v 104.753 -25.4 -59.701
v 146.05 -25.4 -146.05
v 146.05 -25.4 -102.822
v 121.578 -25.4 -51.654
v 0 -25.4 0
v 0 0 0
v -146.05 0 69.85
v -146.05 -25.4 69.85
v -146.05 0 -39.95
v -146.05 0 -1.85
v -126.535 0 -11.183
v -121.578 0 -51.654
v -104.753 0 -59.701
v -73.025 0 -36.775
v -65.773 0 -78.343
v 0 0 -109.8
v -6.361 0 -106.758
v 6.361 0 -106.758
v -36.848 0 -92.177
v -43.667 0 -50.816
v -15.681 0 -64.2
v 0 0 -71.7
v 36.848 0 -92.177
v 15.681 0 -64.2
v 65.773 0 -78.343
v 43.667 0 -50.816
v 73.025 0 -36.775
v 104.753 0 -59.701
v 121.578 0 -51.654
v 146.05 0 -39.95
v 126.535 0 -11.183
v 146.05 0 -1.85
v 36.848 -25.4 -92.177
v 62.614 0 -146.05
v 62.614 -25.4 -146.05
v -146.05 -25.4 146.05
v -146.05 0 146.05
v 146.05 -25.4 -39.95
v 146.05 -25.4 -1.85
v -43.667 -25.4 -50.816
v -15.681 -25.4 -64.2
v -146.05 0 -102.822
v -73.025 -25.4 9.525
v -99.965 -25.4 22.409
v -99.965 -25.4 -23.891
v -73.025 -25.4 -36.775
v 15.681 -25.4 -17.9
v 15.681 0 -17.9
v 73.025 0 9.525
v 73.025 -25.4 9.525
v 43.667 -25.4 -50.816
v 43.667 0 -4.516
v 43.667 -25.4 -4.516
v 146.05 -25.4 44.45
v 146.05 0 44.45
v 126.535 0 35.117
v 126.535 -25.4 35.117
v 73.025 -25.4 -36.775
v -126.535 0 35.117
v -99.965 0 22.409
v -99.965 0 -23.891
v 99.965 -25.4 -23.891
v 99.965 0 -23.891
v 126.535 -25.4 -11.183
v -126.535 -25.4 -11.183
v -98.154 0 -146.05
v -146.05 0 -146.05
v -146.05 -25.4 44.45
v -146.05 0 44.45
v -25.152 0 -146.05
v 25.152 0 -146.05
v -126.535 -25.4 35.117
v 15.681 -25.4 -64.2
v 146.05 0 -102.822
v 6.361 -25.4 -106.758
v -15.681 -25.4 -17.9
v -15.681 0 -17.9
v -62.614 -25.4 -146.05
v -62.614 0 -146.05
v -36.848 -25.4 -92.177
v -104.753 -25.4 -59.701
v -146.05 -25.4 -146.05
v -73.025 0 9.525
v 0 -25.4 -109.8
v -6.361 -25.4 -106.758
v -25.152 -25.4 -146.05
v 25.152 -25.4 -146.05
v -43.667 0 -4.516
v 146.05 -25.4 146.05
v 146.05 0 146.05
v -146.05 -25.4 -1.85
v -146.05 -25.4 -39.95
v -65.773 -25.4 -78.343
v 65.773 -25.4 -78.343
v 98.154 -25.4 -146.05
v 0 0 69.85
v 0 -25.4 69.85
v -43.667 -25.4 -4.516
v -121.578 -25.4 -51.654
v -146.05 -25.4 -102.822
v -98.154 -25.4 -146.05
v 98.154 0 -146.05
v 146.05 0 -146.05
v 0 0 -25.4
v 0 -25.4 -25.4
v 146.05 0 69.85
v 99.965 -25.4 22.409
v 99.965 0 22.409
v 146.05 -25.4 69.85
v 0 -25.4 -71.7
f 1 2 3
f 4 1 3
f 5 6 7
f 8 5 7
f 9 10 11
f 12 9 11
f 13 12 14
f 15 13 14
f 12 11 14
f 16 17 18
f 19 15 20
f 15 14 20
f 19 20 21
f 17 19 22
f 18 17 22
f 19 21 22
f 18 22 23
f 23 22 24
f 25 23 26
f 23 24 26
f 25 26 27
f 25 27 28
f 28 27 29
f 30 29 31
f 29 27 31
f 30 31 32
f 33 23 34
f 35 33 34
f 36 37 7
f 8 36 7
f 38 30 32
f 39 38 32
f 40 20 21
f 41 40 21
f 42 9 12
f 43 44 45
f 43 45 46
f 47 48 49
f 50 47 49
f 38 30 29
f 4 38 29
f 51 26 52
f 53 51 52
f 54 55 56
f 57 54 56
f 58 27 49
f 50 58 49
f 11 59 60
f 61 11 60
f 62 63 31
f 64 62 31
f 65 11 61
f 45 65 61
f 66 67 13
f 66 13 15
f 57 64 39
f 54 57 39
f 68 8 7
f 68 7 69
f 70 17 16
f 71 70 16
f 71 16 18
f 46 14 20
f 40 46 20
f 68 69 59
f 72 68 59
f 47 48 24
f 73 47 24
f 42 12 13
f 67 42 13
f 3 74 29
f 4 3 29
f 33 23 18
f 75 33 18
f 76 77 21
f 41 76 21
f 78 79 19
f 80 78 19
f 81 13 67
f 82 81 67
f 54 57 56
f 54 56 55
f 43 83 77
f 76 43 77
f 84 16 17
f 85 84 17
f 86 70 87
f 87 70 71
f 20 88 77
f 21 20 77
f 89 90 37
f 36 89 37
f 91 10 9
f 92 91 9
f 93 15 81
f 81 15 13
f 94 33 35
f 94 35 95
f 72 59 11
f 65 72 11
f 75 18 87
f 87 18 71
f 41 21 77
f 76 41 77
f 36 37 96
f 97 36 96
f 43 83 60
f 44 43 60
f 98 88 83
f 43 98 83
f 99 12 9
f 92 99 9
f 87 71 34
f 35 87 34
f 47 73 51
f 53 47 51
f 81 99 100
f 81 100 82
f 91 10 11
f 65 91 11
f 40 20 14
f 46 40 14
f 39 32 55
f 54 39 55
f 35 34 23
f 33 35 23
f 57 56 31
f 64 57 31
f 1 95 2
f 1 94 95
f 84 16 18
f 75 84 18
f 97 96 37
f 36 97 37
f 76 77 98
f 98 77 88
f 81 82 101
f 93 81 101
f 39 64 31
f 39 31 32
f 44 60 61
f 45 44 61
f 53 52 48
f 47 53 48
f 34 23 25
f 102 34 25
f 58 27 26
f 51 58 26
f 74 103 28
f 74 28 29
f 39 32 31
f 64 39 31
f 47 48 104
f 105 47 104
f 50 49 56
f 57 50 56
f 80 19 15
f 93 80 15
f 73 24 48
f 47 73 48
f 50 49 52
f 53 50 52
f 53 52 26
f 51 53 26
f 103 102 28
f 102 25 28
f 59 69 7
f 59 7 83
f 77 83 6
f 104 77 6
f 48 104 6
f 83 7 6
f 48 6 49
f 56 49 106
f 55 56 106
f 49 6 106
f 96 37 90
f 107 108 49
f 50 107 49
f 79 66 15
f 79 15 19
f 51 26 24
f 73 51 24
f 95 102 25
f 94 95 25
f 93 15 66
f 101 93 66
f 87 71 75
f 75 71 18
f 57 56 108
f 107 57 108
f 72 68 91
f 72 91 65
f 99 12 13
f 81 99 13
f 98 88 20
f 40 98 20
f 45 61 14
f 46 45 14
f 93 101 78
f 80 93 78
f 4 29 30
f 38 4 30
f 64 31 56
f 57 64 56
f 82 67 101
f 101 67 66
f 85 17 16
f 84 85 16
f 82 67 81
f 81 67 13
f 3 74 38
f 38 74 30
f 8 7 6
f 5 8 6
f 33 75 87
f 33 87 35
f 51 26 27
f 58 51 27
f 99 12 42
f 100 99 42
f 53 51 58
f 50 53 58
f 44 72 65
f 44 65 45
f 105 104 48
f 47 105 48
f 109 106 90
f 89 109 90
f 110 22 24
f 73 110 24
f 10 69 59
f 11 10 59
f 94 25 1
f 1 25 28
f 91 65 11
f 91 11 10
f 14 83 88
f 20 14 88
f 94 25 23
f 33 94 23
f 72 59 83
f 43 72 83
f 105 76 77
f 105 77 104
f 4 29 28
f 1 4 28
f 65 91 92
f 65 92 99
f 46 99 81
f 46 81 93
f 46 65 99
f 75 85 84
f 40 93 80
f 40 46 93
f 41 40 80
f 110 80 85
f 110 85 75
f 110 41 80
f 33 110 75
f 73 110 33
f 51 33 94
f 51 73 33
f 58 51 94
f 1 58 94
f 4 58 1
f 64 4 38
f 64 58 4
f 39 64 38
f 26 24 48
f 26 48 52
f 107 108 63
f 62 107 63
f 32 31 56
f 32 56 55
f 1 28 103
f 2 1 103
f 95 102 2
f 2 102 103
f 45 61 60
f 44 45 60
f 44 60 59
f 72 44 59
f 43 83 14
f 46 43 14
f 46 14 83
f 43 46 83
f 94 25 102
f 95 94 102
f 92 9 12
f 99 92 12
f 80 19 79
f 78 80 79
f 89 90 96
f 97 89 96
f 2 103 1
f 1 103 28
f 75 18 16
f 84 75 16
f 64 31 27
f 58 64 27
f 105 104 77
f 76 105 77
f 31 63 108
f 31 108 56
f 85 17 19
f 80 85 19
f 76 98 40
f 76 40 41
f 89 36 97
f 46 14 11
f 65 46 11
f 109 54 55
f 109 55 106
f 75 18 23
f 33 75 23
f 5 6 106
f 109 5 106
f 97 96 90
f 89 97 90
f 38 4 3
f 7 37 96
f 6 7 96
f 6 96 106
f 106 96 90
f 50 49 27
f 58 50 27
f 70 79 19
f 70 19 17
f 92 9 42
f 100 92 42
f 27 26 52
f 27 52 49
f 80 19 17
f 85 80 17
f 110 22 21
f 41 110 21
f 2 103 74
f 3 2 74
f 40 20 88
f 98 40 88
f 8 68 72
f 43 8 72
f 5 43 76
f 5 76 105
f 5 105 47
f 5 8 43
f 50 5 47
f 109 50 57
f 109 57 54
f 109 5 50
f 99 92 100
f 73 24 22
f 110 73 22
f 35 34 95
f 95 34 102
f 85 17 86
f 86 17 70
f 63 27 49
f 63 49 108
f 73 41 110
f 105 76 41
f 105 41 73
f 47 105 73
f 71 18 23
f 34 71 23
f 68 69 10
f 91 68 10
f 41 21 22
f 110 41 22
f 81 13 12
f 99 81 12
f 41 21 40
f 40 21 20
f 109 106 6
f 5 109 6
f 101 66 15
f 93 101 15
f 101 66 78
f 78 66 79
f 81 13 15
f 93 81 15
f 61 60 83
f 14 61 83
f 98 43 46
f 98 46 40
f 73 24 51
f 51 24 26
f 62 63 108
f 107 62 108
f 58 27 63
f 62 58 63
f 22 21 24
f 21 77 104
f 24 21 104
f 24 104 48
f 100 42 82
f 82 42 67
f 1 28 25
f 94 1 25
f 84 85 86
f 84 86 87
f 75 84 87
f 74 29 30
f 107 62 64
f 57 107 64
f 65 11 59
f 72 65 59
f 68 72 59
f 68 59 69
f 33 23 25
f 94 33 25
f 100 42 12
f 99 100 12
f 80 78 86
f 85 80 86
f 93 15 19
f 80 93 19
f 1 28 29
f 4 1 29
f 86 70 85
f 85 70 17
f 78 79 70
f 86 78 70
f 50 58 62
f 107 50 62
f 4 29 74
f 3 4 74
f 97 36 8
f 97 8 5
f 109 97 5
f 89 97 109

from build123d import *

# Parameters (mm, degrees)
F1_DEPTH  = 25.4
F2_DEPTH  = 25.4
F3_DEPTH  = 25.4
F4_DEPTH  = 25.4
F5_DEPTH  = 25.4
F6_DEPTH  = 25.4
F7_DEPTH  = 25.4
F8_DEPTH  = 25.4
F9_DEPTH  = 25.4
F10_DEPTH = 25.4
F11_DEPTH = 25.4
F12_DEPTH = 25.4
F13_DEPTH = 25.4
F14_DEPTH = 25.4
F15_DEPTH = 25.4
F16_DEPTH = 25.4
F17_DEPTH = 25.4
F18_DEPTH = 25.4
F19_DEPTH = 25.4
F20_DEPTH = 25.4


with BuildPart() as f1:
    # F0 (on Front) → F1 (new body)
    with BuildSketch(Plane.XZ):
        Polygon((0, 69.85), (-146.05, 146.05), (-146.05, 69.85), (0, 0), (146.05, 69.85), (146.05, 146.05), align=None)
    extrude(amount=F1_DEPTH)


with BuildPart() as f2:
    # F0 (on Front) → F2 (new body)
    with BuildSketch(Plane.XZ):
        Polygon((146.05, 146.05), (-146.05, 146.05), (0, 69.85), align=None)
    extrude(amount=F2_DEPTH)


with BuildPart() as f3:
    # F0 (on Front) → F3 (new body)
    with BuildSketch(Plane.XZ):
        Polygon((146.05, 44.45), (146.05, 69.85), (0, 0), (0, -25.4), (15.6810350913, -17.9003745216), (43.666965504, -4.5157991068), (73.025, 9.525), (99.9647179772, 22.4092129456), (126.5349397762, 35.1167103277), align=None)
        Polygon((0, 0), (-146.05, 69.85), (-146.05, 44.45), (-126.5349397762, 35.1167103277), (-99.9647179772, 22.4092129456), (-73.025, 9.525), (-43.666965504, -4.5157991068), (-15.6810350913, -17.9003745216), (0, -25.4), align=None)
    extrude(amount=F3_DEPTH)


with BuildPart() as f4:
    # F0 (on Front) → F4 (new body)
    with BuildSketch(Plane.XZ):
        Polygon((-126.5349397762, 35.1167103277), (-146.05, 44.45), (-146.05, -1.8499833584), (-126.5349397762, -11.1832730307), align=None)
    extrude(amount=F4_DEPTH)


with BuildPart() as f5:
    # F0 (on Front) → F5 (new body)
    with BuildSketch(Plane.XZ):
        Polygon((-99.9647179772, 22.4092129456), (-126.5349397762, 35.1167103277), (-126.5349397762, -11.1832730307), (-99.9647179772, -23.8907704128), align=None)
    extrude(amount=F5_DEPTH)


with BuildPart() as f6:
    # F0 (on Front) → F6 (new body)
    with BuildSketch(Plane.XZ):
        Polygon((-73.025, 9.525), (-99.9647179772, 22.4092129456), (-99.9647179772, -23.8907704128), (-73.025, -36.7749833584), align=None)
    extrude(amount=F6_DEPTH)


with BuildPart() as f7:
    # F0 (on Front) → F7 (new body)
    with BuildSketch(Plane.XZ):
        Polygon((-43.666965504, -4.5157991068), (-73.025, 9.525), (-73.025, -36.7749833584), (-43.666965504, -50.8157824652), align=None)
    extrude(amount=F7_DEPTH)


with BuildPart() as f8:
    # F0 (on Front) → F8 (new body)
    with BuildSketch(Plane.XZ):
        Polygon((-15.6810350913, -64.2003578799), (-15.6810350913, -17.9003745216), (-43.666965504, -4.5157991068), (-43.666965504, -50.8157824652), align=None)
    extrude(amount=F8_DEPTH)


with BuildPart() as f9:
    # F0 (on Front) → F9 (new body)
    with BuildSketch(Plane.XZ):
        Polygon((15.6810350913, -17.9003745216), (0, -25.4), (0, -71.6999833584), (15.6810350913, -64.2003578799), align=None)
        Polygon((0, -71.6999833584), (0, -25.4), (-15.6810350913, -17.9003745216), (-15.6810350913, -64.2003578799), align=None)
    extrude(amount=F9_DEPTH)


with BuildPart() as f10:
    # F0 (on Front) → F10 (new body)
    with BuildSketch(Plane.XZ):
        Polygon((43.666965504, -4.5157991068), (15.6810350913, -17.9003745216), (15.6810350913, -64.2003578799), (43.666965504, -50.8157824652), align=None)
    extrude(amount=F10_DEPTH)


with BuildPart() as f11:
    # F0 (on Front) → F11 (new body)
    with BuildSketch(Plane.XZ):
        Polygon((73.025, 9.525), (43.666965504, -4.5157991068), (43.666965504, -50.8157824652), (73.025, -36.7749833584), align=None)
    extrude(amount=F11_DEPTH)


with BuildPart() as f12:
    # F0 (on Front) → F12 (new body)
    with BuildSketch(Plane.XZ):
        Polygon((99.9647179772, -23.8907704128), (99.9647179772, 22.4092129456), (73.025, 9.525), (73.025, -36.7749833584), align=None)
    extrude(amount=F12_DEPTH)


with BuildPart() as f13:
    # F0 (on Front) → F13 (new body)
    with BuildSketch(Plane.XZ):
        Polygon((126.5349397762, -11.1832730307), (126.5349397762, 35.1167103277), (99.9647179772, 22.4092129456), (99.9647179772, -23.8907704128), align=None)
    extrude(amount=F13_DEPTH)


with BuildPart() as f14:
    # F0 (on Front) → F14 (new body)
    with BuildSketch(Plane.XZ):
        Polygon((146.05, -1.8499833584), (146.05, 44.45), (126.5349397762, 35.1167103277), (126.5349397762, -11.1832730307), align=None)
    extrude(amount=F14_DEPTH)


with BuildPart() as f15:
    # F0 (on Front) → F15 (new body)
    with BuildSketch(Plane.XZ):
        Polygon((-126.5349397762, -11.1832730307), (-146.05, -1.8499833584), (-146.05, -39.9499833584), (-121.5781699621, -51.6539020722), (-104.7526089072, -59.7009095332), (-65.7727373676, -78.3434567913), (-36.8484210278, -92.1768254755), (-6.360621369, -106.7579470515), (0, -109.7999833584), (0, -71.6999833584), (-15.6810350913, -64.2003578799), (-43.666965504, -50.8157824652), (-73.025, -36.7749833584), (-99.9647179772, -23.8907704128), align=None)
        Polygon((146.05, -39.9499833584), (146.05, -1.8499833584), (126.5349397762, -11.1832730307), (99.9647179772, -23.8907704128), (73.025, -36.7749833584), (43.666965504, -50.8157824652), (15.6810350913, -64.2003578799), (0, -71.6999833584), (0, -109.7999833584), (6.360621369, -106.7579470515), (36.8484210278, -92.1768254755), (65.7727373676, -78.3434567913), (104.7526089072, -59.7009095332), (121.5781699621, -51.6539020722), align=None)
    extrude(amount=F15_DEPTH)


with BuildPart() as f16:
    # F0 (on Front) → F16 (new body)
    with BuildSketch(Plane.XZ):
        Polygon((-121.5781699621, -51.6539020722), (-146.05, -39.9499833584), (-146.05, -102.8222739697), align=None)
    extrude(amount=F16_DEPTH)


with BuildPart() as f17:
    # F0 (on Front) → F17 (new body)
    with BuildSketch(Plane.XZ):
        Polygon((-121.5781699621, -51.6539020722), (-146.05, -102.8222739697), (-146.05, -146.05), (-104.7526089072, -59.7009095332), align=None)
    extrude(amount=F17_DEPTH)


with BuildPart() as f18:
    # F0 (on Front) → F18 (new body)
    with BuildSketch(Plane.XZ):
        Polygon((-104.7526089072, -59.7009095332), (-146.05, -146.05), (-98.1541275978, -146.05), (-65.7727373676, -78.3434567913), align=None)
    extrude(amount=F18_DEPTH)


with BuildPart() as f19:
    # F0 (on Front) → F19 (new body)
    with BuildSketch(Plane.XZ):
        Polygon((-65.7727373676, -78.3434567913), (-98.1541275978, -146.05), (-62.6138523221, -146.05), (-36.8484210278, -92.1768254755), align=None)
    extrude(amount=F19_DEPTH)


with BuildPart() as f19b:
    # F0 (on Front) → F19, piece 2 (new body)
    with BuildSketch(Plane.XZ):
        Polygon((6.360621369, -106.7579470515), (0, -109.7999833584), (-6.360621369, -106.7579470515), (-25.1524727792, -146.05), (25.1524727792, -146.05), align=None)
    extrude(amount=F19_DEPTH)


with BuildPart() as f19c:
    # F0 (on Front) → F19, piece 3 (new body)
    with BuildSketch(Plane.XZ):
        Polygon((65.7727373676, -78.3434567913), (36.8484210278, -92.1768254755), (62.6138523221, -146.05), (98.1541275978, -146.05), align=None)
    extrude(amount=F19_DEPTH)


with BuildPart() as f19d:
    # F0 (on Front) → F19, piece 4 (new body)
    with BuildSketch(Plane.XZ):
        Polygon((146.05, -146.05), (146.05, -102.8222739697), (121.5781699621, -51.6539020722), (104.7526089072, -59.7009095332), align=None)
    extrude(amount=F19_DEPTH)


with BuildPart() as f20:
    # F0 (on Front) → F20 (new body)
    with BuildSketch(Plane.XZ):
        Polygon((-25.1524727792, -146.05), (-6.360621369, -106.7579470515), (-36.8484210278, -92.1768254755), (-62.6138523221, -146.05), align=None)
    extrude(amount=F20_DEPTH)


with BuildPart() as f20b:
    # F0 (on Front) → F20, piece 2 (new body)
    with BuildSketch(Plane.XZ):
        Polygon((36.8484210278, -92.1768254755), (6.360621369, -106.7579470515), (25.1524727792, -146.05), (62.6138523221, -146.05), align=None)
    extrude(amount=F20_DEPTH)


with BuildPart() as f20c:
    # F0 (on Front) → F20, piece 3 (new body)
    with BuildSketch(Plane.XZ):
        Polygon((98.1541275978, -146.05), (146.05, -146.05), (104.7526089072, -59.7009095332), (65.7727373676, -78.3434567913), align=None)
    extrude(amount=F20_DEPTH)


with BuildPart() as f20d:
    # F0 (on Front) → F20, piece 4 (new body)
    with BuildSketch(Plane.XZ):
        Polygon((146.05, -102.8222739697), (146.05, -39.9499833584), (121.5781699621, -51.6539020722), align=None)
    extrude(amount=F20_DEPTH)


solid = Compound([f1.part, f2.part, f3.part, f4.part, f5.part, f6.part, f7.part, f8.part, f9.part, f10.part, f11.part, f12.part, f13.part, f14.part, f15.part, f16.part, f17.part, f18.part, f19.part, f19b.part, f19c.part, f19d.part, f20.part, f20b.part, f20c.part, f20d.part])
